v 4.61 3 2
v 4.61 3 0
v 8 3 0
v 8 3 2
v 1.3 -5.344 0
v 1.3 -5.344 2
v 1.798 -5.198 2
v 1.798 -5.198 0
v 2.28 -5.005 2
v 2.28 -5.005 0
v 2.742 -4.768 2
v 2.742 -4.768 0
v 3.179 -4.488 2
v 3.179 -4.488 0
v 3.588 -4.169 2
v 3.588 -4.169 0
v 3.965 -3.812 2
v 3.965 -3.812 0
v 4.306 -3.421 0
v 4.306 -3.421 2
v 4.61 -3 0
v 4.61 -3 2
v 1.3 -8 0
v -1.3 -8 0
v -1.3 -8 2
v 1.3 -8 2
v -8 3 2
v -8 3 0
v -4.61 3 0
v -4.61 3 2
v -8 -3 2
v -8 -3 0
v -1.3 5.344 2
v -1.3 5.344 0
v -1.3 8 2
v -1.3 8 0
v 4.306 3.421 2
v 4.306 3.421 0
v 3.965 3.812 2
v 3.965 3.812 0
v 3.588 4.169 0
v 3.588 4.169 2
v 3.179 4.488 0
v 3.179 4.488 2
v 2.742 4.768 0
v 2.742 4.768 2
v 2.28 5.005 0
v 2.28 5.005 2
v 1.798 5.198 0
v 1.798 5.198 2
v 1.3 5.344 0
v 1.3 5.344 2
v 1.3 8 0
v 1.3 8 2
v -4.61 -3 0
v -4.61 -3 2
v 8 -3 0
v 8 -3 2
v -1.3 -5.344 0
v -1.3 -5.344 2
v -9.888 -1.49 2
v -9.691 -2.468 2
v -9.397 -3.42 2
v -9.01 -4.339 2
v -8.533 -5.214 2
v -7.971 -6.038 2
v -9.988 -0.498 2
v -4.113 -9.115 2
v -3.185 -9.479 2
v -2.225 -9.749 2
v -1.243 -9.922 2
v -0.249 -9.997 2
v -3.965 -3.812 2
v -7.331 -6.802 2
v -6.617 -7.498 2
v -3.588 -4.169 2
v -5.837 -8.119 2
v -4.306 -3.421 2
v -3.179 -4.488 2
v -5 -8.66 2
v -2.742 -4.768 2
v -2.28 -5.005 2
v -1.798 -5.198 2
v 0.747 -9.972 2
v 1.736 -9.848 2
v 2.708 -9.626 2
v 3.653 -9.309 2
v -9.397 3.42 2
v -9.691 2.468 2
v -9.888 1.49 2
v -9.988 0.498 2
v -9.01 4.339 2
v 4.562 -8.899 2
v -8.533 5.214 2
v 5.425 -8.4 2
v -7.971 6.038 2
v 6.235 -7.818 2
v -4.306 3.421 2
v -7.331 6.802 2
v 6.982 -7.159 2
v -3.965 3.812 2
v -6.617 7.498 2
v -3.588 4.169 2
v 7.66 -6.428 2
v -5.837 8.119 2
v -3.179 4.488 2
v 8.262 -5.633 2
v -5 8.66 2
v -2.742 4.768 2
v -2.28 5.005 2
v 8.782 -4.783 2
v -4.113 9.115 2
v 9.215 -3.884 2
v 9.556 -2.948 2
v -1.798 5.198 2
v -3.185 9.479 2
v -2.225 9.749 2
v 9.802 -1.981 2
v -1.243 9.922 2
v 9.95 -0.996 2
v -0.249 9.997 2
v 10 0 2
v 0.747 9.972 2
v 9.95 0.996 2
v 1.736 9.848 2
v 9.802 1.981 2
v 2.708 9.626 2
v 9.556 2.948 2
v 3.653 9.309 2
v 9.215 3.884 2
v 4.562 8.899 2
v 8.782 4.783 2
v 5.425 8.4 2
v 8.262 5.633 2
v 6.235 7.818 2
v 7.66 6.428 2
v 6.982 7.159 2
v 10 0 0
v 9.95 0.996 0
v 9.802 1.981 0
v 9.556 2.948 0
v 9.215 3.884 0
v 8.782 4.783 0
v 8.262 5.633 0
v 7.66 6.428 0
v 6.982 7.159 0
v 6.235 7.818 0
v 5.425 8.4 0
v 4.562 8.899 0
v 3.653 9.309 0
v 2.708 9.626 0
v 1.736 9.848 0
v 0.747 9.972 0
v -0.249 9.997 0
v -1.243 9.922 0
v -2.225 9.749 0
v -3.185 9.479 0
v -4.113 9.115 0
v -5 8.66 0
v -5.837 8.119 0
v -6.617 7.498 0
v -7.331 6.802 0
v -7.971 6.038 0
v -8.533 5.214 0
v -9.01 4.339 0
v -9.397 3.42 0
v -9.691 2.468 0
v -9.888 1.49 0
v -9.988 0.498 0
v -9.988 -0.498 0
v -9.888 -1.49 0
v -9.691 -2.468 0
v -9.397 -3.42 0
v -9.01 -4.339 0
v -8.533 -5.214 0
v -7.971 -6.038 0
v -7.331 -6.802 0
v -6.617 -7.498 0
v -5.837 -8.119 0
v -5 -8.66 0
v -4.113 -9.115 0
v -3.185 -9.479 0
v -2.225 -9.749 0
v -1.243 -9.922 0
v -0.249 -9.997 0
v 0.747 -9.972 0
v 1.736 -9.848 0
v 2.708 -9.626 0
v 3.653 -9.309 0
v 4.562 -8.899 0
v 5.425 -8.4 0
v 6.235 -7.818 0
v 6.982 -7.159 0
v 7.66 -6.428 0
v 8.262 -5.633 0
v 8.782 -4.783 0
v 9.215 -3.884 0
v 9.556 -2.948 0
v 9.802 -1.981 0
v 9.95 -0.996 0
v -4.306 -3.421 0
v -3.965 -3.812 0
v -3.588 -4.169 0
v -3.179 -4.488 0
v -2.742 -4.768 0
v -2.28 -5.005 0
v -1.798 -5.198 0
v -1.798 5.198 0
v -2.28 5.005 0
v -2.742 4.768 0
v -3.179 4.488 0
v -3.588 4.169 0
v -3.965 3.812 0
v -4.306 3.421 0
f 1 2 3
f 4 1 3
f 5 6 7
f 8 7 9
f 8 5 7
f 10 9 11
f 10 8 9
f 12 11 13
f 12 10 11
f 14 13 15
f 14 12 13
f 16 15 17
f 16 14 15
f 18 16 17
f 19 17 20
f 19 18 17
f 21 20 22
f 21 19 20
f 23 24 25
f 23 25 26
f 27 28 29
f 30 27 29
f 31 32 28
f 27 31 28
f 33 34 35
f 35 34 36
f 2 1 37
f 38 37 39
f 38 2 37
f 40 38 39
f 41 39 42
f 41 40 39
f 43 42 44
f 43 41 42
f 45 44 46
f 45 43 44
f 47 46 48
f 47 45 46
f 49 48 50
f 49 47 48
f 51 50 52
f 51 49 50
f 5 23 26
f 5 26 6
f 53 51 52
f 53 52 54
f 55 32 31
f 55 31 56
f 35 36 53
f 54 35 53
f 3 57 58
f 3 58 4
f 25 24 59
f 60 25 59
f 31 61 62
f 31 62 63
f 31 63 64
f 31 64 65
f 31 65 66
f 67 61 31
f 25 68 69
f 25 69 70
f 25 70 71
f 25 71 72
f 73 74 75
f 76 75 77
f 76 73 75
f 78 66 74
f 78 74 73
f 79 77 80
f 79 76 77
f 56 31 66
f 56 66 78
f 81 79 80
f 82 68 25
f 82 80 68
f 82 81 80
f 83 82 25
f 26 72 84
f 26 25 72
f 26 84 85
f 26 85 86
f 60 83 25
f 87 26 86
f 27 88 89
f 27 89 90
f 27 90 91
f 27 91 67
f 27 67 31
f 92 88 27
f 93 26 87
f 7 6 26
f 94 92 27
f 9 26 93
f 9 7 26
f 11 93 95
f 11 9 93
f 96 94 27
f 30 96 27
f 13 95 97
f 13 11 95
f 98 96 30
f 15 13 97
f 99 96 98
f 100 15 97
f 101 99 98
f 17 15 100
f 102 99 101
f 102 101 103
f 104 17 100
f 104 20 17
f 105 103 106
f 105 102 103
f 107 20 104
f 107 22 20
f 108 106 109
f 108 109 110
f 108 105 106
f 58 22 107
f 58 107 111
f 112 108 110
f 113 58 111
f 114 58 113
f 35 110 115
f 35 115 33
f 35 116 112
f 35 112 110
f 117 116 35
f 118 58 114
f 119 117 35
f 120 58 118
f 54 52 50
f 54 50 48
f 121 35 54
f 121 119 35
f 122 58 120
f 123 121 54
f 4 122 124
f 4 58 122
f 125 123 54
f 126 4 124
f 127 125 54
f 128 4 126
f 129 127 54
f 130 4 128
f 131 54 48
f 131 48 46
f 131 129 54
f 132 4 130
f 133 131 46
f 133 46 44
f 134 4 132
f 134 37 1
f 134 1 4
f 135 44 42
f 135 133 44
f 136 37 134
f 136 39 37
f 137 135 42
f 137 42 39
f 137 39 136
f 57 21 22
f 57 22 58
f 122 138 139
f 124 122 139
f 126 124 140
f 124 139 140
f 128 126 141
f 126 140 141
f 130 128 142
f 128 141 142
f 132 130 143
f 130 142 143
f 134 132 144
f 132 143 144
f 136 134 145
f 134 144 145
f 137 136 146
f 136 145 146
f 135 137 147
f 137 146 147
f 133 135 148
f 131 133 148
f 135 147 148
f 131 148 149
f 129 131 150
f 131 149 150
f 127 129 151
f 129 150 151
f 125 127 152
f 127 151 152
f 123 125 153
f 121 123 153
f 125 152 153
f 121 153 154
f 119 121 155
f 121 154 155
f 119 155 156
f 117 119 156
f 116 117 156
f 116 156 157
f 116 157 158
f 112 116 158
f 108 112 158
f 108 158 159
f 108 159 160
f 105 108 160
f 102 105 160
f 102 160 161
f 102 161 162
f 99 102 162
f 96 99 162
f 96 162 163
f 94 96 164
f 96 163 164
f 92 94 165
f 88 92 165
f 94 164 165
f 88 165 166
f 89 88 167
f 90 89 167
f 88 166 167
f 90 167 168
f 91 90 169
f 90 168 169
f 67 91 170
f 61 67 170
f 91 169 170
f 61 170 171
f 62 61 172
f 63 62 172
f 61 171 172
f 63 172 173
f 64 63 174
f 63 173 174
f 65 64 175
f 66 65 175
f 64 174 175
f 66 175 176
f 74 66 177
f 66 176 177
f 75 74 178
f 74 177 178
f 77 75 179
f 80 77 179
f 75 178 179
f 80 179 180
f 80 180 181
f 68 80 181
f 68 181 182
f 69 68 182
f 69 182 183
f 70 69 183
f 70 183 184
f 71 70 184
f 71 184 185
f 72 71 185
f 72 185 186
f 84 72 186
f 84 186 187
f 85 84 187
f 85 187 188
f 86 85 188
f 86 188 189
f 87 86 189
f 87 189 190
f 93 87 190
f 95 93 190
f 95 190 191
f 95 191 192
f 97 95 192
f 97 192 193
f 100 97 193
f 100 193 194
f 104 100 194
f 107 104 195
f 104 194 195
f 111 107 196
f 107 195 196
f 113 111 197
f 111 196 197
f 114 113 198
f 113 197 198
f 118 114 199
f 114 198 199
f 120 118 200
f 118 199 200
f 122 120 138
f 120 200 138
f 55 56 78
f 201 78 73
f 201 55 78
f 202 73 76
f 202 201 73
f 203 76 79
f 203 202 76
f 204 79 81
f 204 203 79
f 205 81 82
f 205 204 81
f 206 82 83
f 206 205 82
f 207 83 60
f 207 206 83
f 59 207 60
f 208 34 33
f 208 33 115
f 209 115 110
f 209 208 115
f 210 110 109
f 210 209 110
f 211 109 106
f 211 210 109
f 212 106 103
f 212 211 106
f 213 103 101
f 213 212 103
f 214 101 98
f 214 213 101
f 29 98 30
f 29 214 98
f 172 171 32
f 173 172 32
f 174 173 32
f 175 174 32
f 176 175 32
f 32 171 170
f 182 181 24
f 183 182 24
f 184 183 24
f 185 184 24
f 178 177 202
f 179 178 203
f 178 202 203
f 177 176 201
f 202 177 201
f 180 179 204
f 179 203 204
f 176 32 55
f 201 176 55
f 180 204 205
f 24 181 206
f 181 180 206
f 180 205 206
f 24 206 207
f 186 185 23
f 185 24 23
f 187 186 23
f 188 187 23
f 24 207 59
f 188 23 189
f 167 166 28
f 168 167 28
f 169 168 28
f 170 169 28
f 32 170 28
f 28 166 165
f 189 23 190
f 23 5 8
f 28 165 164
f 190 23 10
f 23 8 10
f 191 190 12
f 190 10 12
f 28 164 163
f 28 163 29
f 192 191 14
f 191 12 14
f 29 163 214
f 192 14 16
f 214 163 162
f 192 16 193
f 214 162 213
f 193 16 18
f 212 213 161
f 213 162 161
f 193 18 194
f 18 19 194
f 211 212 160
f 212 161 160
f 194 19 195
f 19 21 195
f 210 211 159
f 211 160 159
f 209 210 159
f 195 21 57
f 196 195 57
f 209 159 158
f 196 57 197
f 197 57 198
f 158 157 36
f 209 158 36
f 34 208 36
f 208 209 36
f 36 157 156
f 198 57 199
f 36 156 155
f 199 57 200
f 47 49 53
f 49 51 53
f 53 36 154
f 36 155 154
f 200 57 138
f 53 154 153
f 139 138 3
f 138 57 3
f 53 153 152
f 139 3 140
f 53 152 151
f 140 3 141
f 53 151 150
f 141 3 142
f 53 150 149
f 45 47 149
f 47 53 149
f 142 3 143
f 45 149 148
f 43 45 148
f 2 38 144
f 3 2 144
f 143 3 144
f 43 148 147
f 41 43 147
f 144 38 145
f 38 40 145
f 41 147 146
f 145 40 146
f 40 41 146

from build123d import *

# Parameters (mm, degrees)
SKETCH030_R     = 10
PAD016_DEPTH    = 2
SKETCH031_R     = 5.5
POCKET011_DEPTH = 2.001
SKETCH032_W     = 2.6
SKETCH032_H     = 16
POCKET012_DEPTH = 2.001
SKETCH033_W     = 16
SKETCH033_H     = 6
POCKET013_DEPTH = 2.001


with BuildPart() as part:
    # Sketch030 → Pad016 (new body)
    with BuildSketch(Plane.XY):
        Circle(SKETCH030_R)
    extrude(amount=PAD016_DEPTH)

    # Sketch031 → Pocket011 (cut, through all)
    with BuildSketch(Plane.XY):
        Circle(SKETCH031_R)
    extrude(amount=POCKET011_DEPTH, mode=Mode.SUBTRACT)

    # Sketch032 → Pocket012 (cut, through all)
    with BuildSketch(Plane.XY):
        Rectangle(SKETCH032_W, SKETCH032_H)
    extrude(amount=POCKET012_DEPTH, mode=Mode.SUBTRACT)

    # Sketch033 → Pocket013 (cut, through all)
    with BuildSketch(Plane.XY):
        Rectangle(SKETCH033_W, SKETCH033_H)
    extrude(amount=POCKET013_DEPTH, mode=Mode.SUBTRACT)


solid = part.part
